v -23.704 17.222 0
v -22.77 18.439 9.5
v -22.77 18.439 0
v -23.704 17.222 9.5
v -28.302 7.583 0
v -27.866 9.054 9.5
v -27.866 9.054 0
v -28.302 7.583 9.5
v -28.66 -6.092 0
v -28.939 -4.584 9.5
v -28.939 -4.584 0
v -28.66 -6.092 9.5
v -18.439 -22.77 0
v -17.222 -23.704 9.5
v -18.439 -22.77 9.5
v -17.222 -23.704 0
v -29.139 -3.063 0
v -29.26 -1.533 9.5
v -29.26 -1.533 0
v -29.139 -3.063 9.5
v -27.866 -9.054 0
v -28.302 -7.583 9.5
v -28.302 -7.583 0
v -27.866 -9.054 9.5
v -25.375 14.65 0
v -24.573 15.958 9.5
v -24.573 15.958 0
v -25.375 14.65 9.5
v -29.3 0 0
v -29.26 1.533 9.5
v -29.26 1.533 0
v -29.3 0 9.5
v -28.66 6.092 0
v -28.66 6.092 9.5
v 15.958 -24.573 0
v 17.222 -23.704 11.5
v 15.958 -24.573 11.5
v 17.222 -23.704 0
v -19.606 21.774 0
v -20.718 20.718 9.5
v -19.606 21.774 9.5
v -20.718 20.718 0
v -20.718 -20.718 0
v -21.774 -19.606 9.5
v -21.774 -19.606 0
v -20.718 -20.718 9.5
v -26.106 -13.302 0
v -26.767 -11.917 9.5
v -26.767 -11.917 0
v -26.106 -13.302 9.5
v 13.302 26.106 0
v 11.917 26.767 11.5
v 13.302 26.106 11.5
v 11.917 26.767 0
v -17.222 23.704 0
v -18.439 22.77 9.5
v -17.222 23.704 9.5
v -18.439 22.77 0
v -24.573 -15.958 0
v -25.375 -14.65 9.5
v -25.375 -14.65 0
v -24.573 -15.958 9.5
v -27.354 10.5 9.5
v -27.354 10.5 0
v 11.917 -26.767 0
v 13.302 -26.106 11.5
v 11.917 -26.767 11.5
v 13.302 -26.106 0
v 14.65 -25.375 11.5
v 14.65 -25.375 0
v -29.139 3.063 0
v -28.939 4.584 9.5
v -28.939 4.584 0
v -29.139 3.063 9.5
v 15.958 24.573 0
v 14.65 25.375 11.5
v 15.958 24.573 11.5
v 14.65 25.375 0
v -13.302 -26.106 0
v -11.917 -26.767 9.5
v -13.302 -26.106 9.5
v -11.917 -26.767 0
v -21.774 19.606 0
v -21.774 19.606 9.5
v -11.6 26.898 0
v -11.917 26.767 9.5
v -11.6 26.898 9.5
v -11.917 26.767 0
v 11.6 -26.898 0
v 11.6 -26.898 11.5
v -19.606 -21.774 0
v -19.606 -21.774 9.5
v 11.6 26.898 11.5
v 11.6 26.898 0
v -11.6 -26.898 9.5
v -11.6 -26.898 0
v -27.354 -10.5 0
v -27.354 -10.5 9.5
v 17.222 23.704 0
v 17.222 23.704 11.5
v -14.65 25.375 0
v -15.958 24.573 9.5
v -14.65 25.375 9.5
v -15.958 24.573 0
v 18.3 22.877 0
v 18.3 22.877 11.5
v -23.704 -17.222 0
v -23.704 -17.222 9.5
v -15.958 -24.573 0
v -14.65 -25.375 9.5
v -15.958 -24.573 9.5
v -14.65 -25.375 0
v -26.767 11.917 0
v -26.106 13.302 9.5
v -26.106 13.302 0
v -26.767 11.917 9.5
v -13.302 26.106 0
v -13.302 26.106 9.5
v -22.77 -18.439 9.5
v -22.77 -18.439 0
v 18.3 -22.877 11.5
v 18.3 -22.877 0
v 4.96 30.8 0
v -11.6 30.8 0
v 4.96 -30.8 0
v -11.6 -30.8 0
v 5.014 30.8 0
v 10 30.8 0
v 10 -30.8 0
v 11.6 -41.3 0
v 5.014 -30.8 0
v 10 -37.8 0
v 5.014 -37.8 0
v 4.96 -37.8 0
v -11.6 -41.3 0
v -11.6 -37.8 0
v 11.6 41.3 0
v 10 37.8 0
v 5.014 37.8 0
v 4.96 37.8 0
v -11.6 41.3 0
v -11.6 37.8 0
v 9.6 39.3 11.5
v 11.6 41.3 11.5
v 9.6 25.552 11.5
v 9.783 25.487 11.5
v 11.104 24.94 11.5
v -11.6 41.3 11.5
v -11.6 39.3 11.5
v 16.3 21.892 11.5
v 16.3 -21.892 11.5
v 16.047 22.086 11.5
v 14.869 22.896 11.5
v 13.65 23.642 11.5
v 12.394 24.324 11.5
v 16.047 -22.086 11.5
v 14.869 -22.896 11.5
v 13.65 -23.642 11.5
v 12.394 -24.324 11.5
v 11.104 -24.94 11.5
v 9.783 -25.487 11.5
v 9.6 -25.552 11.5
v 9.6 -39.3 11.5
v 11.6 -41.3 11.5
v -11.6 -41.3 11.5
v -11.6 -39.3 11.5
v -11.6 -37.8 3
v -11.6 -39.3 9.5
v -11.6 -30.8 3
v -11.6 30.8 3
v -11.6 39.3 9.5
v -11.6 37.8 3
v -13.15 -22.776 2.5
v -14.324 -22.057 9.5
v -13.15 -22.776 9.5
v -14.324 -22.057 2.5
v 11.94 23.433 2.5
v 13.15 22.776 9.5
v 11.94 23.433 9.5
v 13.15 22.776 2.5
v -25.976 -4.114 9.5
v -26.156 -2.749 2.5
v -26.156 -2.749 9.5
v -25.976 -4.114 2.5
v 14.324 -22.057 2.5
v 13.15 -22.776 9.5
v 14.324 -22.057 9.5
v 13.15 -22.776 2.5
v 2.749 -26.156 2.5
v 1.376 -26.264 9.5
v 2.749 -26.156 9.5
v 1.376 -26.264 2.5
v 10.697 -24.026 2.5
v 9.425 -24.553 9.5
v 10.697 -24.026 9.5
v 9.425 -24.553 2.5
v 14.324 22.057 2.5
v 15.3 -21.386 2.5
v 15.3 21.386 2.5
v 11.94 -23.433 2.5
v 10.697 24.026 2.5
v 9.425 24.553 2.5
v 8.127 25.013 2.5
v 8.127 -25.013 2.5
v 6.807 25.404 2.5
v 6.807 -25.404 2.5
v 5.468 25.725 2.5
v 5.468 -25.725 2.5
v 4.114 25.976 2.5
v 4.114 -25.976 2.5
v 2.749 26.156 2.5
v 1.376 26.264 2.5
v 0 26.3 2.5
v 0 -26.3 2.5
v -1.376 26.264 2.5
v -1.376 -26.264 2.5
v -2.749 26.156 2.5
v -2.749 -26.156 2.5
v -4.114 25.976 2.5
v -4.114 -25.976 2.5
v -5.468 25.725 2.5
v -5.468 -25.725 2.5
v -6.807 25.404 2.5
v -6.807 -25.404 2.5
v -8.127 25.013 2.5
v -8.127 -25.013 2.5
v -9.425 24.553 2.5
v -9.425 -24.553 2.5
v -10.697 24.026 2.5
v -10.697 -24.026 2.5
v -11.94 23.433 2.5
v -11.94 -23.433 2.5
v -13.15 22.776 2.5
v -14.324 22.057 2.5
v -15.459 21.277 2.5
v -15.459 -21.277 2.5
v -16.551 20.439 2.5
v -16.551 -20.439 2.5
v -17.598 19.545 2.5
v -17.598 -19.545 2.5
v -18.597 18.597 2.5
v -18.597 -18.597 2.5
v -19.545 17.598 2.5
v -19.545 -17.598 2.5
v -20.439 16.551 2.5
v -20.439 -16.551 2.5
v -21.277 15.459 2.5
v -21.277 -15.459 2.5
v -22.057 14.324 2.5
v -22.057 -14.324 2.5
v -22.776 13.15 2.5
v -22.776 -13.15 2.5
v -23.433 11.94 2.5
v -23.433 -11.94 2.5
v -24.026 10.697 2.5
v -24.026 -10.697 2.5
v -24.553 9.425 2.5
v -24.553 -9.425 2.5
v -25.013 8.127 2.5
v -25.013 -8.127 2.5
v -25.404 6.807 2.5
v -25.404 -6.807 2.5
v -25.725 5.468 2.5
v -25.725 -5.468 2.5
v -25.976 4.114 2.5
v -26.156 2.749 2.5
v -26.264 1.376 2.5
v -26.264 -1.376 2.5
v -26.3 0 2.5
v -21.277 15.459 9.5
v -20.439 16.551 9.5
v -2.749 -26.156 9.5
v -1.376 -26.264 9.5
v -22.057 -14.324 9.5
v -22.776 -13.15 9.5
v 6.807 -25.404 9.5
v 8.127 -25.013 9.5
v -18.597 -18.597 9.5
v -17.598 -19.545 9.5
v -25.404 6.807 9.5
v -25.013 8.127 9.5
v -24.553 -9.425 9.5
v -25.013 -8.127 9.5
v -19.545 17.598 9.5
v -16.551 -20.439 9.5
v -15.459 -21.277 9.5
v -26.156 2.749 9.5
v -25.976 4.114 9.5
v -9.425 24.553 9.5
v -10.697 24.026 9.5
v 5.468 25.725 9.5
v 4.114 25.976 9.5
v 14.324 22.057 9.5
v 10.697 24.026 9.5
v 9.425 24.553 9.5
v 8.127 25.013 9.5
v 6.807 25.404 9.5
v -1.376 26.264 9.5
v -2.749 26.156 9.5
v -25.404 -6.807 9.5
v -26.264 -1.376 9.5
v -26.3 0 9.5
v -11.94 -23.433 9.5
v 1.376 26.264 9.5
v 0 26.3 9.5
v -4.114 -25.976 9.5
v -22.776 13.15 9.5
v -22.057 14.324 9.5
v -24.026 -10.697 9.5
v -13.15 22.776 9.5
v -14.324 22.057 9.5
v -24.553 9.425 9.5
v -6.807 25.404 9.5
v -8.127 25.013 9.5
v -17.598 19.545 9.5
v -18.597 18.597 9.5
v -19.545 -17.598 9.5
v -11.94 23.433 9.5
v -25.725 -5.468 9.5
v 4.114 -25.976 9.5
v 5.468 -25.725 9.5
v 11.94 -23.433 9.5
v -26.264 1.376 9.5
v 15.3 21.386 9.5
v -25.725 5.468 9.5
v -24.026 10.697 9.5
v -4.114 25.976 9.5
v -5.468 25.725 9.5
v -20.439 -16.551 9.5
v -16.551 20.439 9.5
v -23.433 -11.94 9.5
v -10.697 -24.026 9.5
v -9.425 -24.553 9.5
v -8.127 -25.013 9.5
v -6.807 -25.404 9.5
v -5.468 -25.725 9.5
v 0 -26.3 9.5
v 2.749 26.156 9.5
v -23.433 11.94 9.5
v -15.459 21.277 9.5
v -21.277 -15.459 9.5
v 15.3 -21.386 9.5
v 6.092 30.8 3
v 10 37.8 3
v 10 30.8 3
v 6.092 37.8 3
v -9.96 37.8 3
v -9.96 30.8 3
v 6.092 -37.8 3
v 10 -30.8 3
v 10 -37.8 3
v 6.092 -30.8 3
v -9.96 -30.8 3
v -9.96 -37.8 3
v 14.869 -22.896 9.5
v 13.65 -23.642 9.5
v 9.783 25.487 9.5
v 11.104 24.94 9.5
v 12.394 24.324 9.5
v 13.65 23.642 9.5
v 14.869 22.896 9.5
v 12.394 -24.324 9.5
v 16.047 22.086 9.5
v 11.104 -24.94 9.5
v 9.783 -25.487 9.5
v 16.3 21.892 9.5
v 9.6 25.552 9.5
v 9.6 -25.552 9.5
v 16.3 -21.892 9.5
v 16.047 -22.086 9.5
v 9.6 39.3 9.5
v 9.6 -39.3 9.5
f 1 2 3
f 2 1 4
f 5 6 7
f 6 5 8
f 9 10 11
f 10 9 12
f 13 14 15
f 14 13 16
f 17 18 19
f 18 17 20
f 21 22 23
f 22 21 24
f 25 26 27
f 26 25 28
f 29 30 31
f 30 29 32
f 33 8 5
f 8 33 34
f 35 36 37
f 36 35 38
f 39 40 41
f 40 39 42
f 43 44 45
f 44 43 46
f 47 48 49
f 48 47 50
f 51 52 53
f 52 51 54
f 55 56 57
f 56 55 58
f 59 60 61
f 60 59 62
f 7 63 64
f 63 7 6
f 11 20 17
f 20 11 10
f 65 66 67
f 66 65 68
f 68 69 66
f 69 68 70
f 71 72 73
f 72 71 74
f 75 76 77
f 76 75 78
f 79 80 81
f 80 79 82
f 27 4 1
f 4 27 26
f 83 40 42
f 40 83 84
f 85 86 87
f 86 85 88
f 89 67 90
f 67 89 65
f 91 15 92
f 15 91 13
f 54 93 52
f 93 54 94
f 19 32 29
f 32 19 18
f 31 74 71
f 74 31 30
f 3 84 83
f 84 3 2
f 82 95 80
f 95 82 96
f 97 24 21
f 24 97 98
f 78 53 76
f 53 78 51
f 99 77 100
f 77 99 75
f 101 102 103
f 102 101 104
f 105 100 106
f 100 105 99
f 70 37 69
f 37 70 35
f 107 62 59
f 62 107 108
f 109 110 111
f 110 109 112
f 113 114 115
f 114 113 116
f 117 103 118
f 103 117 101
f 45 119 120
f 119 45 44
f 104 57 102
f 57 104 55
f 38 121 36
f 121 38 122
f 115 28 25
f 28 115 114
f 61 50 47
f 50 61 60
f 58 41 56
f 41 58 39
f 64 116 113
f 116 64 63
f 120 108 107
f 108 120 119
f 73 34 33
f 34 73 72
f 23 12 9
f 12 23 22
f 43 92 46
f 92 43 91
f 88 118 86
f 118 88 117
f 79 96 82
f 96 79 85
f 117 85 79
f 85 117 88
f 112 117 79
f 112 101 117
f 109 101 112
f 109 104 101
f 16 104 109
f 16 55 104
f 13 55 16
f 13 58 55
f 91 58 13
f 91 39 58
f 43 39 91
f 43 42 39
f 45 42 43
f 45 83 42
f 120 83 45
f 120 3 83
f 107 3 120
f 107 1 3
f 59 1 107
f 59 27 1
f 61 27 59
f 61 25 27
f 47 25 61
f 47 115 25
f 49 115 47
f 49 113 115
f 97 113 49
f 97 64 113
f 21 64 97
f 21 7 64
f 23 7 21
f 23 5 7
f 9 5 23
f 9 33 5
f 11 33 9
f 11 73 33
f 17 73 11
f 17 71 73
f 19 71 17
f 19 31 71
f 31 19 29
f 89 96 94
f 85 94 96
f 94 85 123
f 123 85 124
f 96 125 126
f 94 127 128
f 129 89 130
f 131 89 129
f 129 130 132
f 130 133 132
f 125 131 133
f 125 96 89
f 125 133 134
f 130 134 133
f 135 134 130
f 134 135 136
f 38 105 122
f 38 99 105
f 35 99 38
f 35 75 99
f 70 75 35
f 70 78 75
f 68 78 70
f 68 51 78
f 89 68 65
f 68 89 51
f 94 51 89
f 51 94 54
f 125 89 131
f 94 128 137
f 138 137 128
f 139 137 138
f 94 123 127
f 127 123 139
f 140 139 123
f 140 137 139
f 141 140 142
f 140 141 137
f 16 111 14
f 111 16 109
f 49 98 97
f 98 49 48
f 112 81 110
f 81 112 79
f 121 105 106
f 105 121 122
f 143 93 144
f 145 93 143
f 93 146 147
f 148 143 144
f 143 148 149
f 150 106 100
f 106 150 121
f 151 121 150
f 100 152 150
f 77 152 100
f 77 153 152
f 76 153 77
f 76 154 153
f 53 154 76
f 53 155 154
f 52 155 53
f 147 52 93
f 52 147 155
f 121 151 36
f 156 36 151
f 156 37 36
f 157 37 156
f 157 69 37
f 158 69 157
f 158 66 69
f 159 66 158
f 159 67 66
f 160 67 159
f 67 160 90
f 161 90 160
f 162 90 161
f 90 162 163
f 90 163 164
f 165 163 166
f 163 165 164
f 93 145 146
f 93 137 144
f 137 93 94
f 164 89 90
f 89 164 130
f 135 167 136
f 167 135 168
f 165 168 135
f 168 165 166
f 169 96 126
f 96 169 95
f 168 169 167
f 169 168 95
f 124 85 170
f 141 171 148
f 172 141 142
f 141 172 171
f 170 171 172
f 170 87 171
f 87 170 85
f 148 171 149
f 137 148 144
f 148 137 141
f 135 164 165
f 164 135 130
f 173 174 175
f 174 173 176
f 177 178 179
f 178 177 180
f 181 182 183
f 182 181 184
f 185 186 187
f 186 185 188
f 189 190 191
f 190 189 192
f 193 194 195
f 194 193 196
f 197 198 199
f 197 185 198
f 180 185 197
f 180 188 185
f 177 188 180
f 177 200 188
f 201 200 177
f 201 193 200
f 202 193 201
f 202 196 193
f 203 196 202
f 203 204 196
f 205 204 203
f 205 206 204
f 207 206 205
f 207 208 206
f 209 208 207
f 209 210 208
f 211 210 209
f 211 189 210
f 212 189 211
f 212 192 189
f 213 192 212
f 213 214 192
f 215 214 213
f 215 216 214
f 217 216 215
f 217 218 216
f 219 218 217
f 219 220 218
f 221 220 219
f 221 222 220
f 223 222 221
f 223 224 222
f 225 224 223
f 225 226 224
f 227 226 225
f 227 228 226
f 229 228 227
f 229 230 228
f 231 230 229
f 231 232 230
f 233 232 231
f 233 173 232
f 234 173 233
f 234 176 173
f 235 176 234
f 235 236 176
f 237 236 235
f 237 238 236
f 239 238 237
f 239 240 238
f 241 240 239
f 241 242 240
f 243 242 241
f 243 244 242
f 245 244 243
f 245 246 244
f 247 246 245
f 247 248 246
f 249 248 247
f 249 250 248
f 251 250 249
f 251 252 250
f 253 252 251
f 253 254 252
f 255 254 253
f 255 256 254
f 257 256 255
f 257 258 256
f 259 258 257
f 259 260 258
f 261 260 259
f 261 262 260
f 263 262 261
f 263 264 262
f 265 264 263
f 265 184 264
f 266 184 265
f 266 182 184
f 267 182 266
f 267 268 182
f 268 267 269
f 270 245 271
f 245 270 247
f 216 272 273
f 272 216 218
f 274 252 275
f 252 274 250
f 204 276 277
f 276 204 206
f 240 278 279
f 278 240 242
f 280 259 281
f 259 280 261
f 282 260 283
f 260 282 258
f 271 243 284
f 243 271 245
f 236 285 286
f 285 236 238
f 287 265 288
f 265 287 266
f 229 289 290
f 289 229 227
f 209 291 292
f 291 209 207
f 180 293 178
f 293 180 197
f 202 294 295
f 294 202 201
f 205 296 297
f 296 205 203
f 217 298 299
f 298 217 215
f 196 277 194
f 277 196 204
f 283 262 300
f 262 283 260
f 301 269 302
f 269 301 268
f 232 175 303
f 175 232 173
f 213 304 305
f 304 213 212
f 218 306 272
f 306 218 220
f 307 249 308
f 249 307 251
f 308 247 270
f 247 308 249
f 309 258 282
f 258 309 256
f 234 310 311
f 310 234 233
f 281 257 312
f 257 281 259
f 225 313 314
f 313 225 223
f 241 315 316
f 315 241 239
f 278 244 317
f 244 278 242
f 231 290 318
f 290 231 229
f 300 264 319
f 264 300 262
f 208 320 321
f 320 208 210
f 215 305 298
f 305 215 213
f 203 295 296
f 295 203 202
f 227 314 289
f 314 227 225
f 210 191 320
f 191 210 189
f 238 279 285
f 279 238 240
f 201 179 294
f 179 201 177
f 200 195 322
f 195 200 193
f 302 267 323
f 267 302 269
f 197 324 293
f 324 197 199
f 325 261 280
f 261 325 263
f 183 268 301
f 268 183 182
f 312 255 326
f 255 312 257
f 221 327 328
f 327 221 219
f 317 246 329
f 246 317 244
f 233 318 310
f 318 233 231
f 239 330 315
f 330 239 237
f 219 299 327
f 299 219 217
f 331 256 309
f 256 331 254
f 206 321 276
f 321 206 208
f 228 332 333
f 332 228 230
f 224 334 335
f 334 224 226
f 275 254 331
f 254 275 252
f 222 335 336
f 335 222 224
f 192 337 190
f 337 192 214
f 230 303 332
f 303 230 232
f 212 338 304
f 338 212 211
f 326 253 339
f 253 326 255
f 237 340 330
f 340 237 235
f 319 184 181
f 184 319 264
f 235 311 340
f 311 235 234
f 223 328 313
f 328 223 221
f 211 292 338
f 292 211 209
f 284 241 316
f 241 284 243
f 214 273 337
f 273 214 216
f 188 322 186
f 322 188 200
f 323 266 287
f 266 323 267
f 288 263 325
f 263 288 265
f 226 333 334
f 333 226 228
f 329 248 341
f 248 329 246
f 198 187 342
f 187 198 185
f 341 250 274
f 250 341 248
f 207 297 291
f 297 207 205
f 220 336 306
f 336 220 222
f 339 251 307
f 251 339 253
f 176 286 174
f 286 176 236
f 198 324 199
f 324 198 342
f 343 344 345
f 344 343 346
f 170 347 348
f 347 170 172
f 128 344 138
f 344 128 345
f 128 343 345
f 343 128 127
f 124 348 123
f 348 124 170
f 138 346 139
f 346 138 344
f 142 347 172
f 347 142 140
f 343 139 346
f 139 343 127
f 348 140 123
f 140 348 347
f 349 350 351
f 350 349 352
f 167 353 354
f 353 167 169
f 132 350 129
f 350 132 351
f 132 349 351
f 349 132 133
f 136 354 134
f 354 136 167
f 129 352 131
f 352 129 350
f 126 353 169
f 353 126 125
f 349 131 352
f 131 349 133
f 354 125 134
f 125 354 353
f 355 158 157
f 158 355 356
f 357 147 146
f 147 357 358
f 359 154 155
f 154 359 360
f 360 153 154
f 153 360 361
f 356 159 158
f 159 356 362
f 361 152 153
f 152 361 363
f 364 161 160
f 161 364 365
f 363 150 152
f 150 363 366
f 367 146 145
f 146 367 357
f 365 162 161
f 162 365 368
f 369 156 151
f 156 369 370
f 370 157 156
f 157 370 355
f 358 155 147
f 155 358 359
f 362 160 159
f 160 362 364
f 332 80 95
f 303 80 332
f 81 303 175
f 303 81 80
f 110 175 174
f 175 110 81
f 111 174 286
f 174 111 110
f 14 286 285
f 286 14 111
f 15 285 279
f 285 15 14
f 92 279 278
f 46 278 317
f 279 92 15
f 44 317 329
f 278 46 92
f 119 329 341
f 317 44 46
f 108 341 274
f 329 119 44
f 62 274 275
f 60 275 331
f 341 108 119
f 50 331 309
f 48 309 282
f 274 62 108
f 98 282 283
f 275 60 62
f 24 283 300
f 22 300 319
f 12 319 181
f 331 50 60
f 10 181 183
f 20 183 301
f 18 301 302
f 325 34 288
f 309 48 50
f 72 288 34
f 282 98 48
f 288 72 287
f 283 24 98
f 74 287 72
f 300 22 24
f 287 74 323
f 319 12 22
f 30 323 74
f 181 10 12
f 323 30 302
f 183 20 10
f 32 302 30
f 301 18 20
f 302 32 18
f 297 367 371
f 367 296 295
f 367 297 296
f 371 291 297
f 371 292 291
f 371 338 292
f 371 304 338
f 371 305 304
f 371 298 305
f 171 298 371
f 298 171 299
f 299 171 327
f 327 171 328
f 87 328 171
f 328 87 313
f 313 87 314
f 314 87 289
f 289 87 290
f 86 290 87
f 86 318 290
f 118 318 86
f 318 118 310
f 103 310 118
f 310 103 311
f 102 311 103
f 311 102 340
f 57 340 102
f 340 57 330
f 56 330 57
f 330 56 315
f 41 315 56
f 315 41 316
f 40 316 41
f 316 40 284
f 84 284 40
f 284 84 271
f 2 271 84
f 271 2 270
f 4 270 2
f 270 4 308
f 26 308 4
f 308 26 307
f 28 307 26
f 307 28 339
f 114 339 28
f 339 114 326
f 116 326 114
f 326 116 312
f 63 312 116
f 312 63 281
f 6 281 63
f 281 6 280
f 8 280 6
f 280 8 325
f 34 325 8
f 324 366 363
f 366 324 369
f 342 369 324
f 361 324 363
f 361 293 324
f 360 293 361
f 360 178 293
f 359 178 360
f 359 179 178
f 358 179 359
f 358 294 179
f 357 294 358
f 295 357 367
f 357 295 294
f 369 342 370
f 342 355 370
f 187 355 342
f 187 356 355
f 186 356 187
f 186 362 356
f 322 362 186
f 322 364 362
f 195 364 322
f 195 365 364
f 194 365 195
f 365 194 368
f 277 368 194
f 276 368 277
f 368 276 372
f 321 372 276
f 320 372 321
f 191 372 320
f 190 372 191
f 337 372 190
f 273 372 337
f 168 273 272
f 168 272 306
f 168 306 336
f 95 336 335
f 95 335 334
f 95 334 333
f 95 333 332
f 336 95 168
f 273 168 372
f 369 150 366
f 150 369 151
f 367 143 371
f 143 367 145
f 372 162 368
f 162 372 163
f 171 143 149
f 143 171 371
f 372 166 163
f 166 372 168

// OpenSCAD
// Ps3eye mount system for reprap Mark "Ckaos" Moissette
//It is licensed under the Creative Commons - GNU GPL license.
// © 2011 by Mark "Ckaos" Moissette
//http://www.thingiverse.com/thing:9448

///////////////////////////////
//example usage
cam_mount(bottom=true);


/*difference()
{
	translate([0,0,-3])
	cube([35,30,10],center =true);
	snap_on(length=20, width=12, height=4, head_length=5);
	
}*/

//snap_on(length=20, width=12, height=4, head_length=5);
///////////////////////////////
// USER PARAMETERS
///////////////////////////////
$fs=0.2; // def 1, 0.2 is high res
$fa=3;//def 12, 3 is very nice


shortened_dia=41.6;//the "dia at the cut, don't need to change this
base_dia=52.6;//the base's diameter: this should be ok too
base_height=8;//height of the bottom plate
base_rim=3;
bottom_thickness=2.5;//thickness of the bottom plate
foot_thickness=6.12;
latteral_border=2;


top_collar_dia=18.5;//diameter of the rounding at the base of the cam + some extra
top_thickness=3;//thcikness of the top plate

//mounting clamp infos
//IMPORTANT NOTE : the diameter of your reprap's rods are set in the clamp's file, but you might need to adjust the mounting holes distances here

clamp_mount_hole_dia=3.2;
clamp_mount_hole_distance=8;
clamp_mount_length=23.2;
clamp_mount_width=12.0;

mount_holes_lateral_offset=base_dia/2+base_rim+clamp_mount_width/2;
blocks_width=(mount_holes_lateral_offset+clamp_mount_width/2)*2;

clamp_together_type=1;//0--> holes/nuts and bolts// 1-->special clamp
// //////////////////////////////
// OpenSCAD SCRIPT
// //////////////////////////////

module cam_mount(bottom=true)
{
	if(bottom)
	{
		difference()
		{
			cam_base();
			
					}
		
	}
	else
	{
		cam_top();
	}
}

module  cam_base()
{	
	height=bottom_thickness+foot_thickness;
	difference()
	{
		union()
		{
		cut_off(base_dia+base_rim*2,shortened_dia+base_rim*2,height);
		

		//clamp mount blocks
		translate([0,0,height/2]) 	cube([clamp_mount_length,blocks_width,height],center=true);

		
		translate([0,0,8.5])  cut_off(base_dia+base_rim*2,shortened_dia+base_rim*2,3);
		translate([0,0,10]) 	cube([clamp_mount_length,blocks_width,3],center=true);
		//translate([0,-blocks_width/2+latteral_border/2,10])  cube([clamp_mount_length,latteral_border,3],center=true);
		//translate([0,blocks_width/2-latteral_border/2,10])  cube([clamp_mount_length,latteral_border,3],center=true);
		
		}
		union()
		{
		translate([0,0,bottom_thickness]) 	cut_off(base_dia,shortened_dia,14);

		if (clamp_together_type ==0)
		{
		
		//mount holes
		translate([clamp_mount_hole_distance,mount_holes_lateral_offset,height/2])  cylinder(r=clamp_mount_hole_dia/2,h=height+0.1,center=true);
		translate([-clamp_mount_hole_distance,mount_holes_lateral_offset,height/2])  cylinder(r=clamp_mount_hole_dia/2,h=height+0.1,center=true);

		translate([clamp_mount_hole_distance,-mount_holes_lateral_offset,height/2])  cylinder(r=clamp_mount_hole_dia/2,h=height+0.1,center=true);
		translate([-clamp_mount_hole_distance,-mount_holes_lateral_offset,height/2])  cylinder(r=clamp_mount_hole_dia/2,h=height+0.1,center=true);
		}
		else
		{
			translate([0,mount_holes_lateral_offset-1,1.5])  
			rotate([0,0,180])
			mirror([0,0,1]) snap_on(length=20, width=7, height=3, head_length=5);

			translate([0,-mount_holes_lateral_offset+1,1.5])  
			rotate([0,0,180])
			mirror([0,0,1]) snap_on(length=20, width=7, height=3, head_length=5);

		}

		//top mount
		translate([-latteral_border-clamp_mount_length/2,0,11]) cube([clamp_mount_length*2,blocks_width-latteral_border*2,3],center=true);
		translate([0,0,9.5]) 	cut_off(base_dia+2,shortened_dia+2,3);
		}

	}
}


module  cam_top()
{	

	difference()
	{
		union()
		{
		cut_off(base_dia+base_rim*2,shortened_dia+base_rim*2,top_thickness);


		//clamp mount blocks
		translate([0,0,top_thickness/2]) 	cube([clamp_mount_length,blocks_width,top_thickness],center=true);
		
		}
		union()
		{
		translate([0,0,top_thickness/2])  cylinder(r=top_collar_dia/2,h=top_thickness+0.1,center=true);	
		translate([base_dia/2,0,top_thickness/2])  cube([base_dia,top_collar_dia,top_thickness+0.1],center=true);

		//mount holes
		translate([clamp_mount_hole_distance,mount_holes_lateral_offset,top_thickness])  cylinder(r=clamp_mount_hole_dia/2,h=base_height+0.1,center=true);
		translate([-clamp_mount_hole_distance,mount_holes_lateral_offset,top_thickness])  cylinder(r=clamp_mount_hole_dia/2,h=base_height+0.1,center=true);

		translate([clamp_mount_hole_distance,-mount_holes_lateral_offset,top_thickness])  cylinder(r=clamp_mount_hole_dia/2,h=base_height+0.1,center=true);
		translate([-clamp_mount_hole_distance,-mount_holes_lateral_offset,top_thickness])  cylinder(r=clamp_mount_hole_dia/2,h=base_height+0.1,center=true);


		}
	}
}

module cut_off(diameter=50,shortened_dia=40,height=10)
{
	cut_size=diameter-shortened_dia;
	difference()
	{
		
		translate([0,0,height/2]) cylinder(r=diameter/2,h=height,center=true);
		translate([diameter/2-cut_size/2,0,height/2]) cube([cut_size,diameter,height+0.1],center=true);
	}
}

module snap_on(length=10, width=5, height=5, head_length=2, front_flat_extra=10, downslope=20)
{
	slope_length=length-head_length;
	downslope_base=min(head_length, (sin(downslope)*(height /cos(downslope))));

	xtra =0.01;
	difference()
	{
		union()
		{
			cube([length,width,height],center=true);
			translate([length,0,0]) cube([length,width,height],center=true);
		}
		
		translate([head_length/2,0,0])
		rotate([0,-90,-90])
		linear_extrude(height = width+xtra, center = true, convexity = 50, twist = 0)
		{
		polygon(points = 
			[[-height/2,-slope_length/2-downslope_base]
			,[-height/2-xtra,slope_length/2+xtra]
			,[height/2+xtra,-slope_length/2-xtra]
			]
			,paths = [[0,1,2]]);
		}
		
		
	}
}
